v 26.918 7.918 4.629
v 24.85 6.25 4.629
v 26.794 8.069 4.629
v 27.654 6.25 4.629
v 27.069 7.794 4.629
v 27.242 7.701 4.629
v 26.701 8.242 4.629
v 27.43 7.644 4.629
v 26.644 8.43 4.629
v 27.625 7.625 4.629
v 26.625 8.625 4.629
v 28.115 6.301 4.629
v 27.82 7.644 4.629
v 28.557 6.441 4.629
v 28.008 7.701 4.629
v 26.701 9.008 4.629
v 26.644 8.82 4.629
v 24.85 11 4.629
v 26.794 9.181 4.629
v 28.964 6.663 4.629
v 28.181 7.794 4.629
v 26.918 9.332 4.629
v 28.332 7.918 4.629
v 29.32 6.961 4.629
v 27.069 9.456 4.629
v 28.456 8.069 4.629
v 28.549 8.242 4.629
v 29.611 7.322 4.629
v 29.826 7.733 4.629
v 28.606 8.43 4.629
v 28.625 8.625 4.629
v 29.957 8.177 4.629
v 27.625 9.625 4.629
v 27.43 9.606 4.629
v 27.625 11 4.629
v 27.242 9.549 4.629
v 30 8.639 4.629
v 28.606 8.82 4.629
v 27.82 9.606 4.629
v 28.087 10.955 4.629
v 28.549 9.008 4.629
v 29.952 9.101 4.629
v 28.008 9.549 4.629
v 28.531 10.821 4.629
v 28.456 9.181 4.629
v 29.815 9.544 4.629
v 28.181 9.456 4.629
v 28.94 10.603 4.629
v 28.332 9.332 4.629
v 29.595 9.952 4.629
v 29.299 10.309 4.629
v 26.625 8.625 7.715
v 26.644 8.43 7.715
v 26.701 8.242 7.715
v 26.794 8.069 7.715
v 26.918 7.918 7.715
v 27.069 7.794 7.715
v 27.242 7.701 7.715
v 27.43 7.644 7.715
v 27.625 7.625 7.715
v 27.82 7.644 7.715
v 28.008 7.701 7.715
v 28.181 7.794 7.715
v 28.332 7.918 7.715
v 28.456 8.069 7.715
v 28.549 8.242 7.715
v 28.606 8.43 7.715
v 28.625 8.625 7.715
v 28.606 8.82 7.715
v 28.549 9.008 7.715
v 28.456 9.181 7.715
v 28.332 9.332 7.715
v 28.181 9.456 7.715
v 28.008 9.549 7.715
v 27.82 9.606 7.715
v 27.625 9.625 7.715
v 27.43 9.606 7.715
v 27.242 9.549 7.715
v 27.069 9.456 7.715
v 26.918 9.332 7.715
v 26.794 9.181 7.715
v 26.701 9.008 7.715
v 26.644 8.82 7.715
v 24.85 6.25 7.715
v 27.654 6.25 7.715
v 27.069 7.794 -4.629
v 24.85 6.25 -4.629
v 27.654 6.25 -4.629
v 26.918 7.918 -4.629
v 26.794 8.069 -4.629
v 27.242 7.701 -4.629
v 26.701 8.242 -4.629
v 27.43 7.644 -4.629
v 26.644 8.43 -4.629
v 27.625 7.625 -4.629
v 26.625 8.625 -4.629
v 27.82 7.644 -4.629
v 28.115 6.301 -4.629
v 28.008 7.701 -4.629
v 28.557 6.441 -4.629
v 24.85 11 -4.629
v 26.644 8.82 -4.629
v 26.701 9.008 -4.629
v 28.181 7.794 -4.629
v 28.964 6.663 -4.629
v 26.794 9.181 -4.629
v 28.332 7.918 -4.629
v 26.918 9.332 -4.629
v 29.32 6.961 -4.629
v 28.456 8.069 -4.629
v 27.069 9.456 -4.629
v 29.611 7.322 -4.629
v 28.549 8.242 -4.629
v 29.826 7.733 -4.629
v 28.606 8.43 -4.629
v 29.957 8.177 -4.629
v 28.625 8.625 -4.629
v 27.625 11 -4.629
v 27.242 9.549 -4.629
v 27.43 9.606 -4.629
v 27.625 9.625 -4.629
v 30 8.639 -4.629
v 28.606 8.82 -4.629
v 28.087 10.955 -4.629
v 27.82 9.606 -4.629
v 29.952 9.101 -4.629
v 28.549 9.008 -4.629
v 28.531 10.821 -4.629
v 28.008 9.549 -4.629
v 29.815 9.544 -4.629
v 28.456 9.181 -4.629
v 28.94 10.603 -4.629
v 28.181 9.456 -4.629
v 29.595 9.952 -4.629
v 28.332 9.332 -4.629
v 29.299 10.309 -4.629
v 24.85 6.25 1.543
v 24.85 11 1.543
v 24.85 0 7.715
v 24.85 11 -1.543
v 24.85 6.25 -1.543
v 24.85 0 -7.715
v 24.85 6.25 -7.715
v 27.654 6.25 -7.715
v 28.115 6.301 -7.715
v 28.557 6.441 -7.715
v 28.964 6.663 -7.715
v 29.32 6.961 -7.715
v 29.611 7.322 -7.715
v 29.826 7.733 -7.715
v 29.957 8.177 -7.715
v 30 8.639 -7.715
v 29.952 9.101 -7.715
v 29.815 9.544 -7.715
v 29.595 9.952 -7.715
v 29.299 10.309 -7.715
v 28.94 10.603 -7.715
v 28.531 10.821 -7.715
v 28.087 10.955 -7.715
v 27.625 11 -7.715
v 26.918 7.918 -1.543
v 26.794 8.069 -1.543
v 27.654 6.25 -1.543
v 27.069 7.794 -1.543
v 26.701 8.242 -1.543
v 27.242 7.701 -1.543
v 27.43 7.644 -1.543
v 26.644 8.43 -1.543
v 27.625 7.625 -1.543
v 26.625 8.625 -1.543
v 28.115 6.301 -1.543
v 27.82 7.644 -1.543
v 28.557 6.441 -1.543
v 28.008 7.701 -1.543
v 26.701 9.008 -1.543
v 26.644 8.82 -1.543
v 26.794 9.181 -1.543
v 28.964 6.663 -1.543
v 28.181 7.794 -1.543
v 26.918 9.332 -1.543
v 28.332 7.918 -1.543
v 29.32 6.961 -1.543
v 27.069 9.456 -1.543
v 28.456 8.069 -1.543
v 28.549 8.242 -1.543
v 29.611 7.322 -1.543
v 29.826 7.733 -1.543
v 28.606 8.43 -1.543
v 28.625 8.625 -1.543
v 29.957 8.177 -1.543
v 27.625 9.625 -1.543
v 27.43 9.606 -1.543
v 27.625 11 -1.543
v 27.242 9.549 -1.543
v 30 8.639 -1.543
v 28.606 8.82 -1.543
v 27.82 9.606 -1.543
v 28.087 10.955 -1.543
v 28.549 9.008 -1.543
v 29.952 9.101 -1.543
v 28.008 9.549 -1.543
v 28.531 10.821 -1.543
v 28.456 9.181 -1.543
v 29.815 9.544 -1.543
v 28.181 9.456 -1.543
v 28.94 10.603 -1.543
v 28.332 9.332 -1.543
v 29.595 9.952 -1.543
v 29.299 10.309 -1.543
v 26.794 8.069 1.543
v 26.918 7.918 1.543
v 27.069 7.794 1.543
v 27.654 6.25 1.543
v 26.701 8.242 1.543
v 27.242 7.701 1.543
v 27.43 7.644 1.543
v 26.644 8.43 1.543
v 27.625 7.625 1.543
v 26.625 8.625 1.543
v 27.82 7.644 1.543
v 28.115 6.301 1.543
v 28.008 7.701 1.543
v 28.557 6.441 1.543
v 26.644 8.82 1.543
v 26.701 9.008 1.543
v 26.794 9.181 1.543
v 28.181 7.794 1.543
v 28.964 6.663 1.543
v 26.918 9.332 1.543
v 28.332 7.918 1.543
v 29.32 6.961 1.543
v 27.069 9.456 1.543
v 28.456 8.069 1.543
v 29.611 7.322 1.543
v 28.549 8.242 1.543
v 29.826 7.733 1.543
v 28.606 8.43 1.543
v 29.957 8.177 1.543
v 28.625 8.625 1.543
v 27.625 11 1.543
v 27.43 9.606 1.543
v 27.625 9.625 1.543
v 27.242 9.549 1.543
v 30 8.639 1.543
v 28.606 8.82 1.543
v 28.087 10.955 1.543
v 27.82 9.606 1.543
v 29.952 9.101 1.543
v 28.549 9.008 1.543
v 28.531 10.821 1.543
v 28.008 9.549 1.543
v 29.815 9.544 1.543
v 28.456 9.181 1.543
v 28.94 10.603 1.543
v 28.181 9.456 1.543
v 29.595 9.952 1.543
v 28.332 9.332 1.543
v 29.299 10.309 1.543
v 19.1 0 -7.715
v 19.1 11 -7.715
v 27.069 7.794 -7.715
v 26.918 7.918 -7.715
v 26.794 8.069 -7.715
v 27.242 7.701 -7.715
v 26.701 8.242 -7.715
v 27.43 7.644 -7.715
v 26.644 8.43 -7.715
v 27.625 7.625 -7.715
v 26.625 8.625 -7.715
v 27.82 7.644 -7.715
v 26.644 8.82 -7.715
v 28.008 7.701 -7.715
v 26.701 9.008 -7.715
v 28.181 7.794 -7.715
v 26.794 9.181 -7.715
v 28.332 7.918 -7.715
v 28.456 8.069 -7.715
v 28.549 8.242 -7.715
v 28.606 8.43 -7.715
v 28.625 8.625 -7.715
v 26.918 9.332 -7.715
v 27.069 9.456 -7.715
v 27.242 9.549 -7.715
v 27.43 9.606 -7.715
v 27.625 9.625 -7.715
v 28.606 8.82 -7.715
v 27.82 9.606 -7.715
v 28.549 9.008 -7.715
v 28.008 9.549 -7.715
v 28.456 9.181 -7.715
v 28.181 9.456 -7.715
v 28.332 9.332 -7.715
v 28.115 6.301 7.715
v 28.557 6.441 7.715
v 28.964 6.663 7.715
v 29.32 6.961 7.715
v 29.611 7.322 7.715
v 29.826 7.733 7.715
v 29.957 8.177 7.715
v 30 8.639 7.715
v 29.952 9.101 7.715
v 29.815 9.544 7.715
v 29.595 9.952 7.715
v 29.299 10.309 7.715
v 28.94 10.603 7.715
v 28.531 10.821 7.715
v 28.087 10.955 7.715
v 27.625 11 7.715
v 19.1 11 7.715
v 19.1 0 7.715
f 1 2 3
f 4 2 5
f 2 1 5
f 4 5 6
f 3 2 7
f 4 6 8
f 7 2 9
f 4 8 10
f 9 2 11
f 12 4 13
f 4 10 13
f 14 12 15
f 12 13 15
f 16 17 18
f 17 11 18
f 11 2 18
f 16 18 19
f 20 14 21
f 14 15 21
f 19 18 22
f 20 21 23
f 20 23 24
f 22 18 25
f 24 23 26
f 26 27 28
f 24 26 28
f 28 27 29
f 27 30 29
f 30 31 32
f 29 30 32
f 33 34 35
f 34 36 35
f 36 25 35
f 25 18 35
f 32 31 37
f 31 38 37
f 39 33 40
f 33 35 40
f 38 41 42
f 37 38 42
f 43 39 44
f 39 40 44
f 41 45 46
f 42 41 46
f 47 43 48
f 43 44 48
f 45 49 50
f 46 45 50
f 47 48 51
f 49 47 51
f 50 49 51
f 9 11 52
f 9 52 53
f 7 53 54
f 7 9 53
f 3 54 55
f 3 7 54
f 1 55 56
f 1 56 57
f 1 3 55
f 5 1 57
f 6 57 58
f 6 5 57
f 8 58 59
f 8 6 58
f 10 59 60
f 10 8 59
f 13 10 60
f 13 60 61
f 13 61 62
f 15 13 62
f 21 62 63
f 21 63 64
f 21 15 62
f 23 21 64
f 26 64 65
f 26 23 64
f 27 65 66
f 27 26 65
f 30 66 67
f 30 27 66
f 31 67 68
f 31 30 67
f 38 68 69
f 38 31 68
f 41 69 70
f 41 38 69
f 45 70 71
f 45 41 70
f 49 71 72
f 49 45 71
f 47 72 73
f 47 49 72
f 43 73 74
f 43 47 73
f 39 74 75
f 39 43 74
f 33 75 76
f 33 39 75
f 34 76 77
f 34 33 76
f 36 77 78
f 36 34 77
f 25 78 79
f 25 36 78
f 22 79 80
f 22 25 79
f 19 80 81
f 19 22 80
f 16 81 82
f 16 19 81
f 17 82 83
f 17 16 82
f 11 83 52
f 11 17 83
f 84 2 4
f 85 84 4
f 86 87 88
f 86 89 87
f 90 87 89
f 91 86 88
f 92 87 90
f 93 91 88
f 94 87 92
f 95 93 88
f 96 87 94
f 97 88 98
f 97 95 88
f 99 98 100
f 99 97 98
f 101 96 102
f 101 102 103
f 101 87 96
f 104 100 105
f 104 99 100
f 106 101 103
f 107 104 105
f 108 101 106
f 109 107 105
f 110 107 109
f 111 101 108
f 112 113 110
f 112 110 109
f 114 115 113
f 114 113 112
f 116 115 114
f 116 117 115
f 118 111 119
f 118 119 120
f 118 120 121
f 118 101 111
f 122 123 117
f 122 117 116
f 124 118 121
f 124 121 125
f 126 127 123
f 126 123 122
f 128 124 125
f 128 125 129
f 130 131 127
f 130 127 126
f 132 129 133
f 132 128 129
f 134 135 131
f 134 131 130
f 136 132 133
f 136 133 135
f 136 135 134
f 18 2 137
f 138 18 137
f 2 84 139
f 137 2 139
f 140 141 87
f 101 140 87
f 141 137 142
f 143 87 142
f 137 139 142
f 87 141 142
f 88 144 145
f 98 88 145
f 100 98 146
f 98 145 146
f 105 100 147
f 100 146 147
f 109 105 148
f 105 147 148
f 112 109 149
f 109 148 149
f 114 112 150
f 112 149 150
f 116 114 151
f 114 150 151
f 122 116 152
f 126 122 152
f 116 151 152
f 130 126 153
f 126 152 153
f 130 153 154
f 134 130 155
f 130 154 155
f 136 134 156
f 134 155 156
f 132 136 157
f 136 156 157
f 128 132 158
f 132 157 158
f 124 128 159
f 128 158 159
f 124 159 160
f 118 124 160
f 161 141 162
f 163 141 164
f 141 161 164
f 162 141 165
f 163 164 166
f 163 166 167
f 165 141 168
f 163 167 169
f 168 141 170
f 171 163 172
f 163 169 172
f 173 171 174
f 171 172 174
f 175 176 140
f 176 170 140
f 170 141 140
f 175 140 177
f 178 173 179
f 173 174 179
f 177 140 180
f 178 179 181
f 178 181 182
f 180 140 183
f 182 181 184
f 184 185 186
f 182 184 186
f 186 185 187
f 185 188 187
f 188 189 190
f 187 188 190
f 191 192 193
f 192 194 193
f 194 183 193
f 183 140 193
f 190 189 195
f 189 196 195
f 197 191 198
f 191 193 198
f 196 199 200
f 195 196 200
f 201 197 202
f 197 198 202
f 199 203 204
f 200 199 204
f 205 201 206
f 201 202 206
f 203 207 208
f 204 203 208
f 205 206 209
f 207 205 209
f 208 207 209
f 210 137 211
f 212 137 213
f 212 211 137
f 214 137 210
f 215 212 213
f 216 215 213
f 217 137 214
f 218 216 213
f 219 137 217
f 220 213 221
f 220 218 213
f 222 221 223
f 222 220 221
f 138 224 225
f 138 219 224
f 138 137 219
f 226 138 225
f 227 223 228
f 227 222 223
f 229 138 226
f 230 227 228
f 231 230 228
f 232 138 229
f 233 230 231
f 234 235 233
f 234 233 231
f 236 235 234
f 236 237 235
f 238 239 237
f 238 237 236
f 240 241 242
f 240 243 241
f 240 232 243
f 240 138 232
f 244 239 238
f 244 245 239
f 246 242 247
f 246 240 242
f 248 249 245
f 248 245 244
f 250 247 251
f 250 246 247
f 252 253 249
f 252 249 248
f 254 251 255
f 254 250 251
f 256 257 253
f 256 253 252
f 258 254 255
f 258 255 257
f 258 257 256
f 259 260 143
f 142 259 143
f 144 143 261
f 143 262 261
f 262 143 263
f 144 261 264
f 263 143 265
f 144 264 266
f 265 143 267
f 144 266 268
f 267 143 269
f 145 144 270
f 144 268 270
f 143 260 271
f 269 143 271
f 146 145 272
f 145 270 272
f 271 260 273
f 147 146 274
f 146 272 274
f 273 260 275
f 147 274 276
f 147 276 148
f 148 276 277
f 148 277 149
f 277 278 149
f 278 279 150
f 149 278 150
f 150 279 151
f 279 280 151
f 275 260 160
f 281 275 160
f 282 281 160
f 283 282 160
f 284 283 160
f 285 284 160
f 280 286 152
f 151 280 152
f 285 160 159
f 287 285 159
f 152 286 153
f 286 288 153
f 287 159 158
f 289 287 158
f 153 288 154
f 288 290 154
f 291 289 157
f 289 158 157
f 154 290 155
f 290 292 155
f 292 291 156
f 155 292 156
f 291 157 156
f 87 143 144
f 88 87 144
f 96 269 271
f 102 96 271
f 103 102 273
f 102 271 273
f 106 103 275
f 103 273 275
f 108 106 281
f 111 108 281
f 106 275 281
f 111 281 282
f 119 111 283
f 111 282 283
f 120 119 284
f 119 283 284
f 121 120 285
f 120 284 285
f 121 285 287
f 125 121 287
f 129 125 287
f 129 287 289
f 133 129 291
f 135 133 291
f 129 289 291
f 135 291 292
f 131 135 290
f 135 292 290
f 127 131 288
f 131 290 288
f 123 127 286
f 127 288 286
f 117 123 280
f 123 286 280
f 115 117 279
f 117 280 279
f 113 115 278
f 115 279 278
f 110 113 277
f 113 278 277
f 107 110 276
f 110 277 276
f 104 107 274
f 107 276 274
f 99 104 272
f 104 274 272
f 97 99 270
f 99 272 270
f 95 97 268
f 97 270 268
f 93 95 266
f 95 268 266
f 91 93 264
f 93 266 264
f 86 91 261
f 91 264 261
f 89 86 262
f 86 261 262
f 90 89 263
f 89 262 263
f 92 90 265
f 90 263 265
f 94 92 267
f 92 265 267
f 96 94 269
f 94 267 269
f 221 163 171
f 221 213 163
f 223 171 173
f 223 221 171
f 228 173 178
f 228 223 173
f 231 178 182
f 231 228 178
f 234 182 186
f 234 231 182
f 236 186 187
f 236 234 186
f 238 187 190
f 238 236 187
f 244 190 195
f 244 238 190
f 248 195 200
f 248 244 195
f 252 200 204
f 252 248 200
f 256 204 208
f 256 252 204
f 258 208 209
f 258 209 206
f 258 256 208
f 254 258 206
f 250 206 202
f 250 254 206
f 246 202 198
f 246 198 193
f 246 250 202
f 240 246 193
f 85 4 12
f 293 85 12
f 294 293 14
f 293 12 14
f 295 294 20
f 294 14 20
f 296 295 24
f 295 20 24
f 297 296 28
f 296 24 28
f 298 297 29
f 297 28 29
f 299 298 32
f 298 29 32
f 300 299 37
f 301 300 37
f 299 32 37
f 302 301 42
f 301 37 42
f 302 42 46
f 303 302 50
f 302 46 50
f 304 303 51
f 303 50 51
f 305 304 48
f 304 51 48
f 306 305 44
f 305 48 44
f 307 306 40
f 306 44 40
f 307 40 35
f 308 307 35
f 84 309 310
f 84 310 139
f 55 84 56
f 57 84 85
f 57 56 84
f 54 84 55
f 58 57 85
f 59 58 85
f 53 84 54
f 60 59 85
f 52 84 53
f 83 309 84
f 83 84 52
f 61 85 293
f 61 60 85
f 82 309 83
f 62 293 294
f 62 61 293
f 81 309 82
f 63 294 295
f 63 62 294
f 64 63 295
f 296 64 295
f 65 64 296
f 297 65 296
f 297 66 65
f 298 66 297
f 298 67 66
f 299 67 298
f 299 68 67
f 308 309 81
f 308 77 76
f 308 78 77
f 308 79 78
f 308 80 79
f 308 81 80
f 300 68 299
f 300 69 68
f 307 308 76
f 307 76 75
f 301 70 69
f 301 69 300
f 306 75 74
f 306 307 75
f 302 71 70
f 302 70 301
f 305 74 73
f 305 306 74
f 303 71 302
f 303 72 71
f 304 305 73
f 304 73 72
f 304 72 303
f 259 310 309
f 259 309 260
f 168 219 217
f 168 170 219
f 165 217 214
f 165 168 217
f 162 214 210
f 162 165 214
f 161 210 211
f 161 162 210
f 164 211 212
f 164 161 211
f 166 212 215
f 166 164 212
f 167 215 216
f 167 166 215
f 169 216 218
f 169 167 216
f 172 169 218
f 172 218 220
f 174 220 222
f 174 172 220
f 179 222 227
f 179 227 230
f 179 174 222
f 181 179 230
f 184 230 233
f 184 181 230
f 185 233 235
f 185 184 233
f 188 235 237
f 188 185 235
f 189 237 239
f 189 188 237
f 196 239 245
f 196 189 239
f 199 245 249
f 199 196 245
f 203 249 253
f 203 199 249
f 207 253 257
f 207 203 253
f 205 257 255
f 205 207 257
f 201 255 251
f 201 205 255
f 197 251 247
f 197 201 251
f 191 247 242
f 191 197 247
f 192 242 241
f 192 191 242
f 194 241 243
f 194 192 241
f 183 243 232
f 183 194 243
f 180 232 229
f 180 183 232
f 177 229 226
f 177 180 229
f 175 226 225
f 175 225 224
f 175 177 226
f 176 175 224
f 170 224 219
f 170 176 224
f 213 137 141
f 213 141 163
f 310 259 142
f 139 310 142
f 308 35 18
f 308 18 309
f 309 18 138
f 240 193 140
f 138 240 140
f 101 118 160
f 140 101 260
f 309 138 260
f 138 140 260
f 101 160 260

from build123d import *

# Parameters (mm, degrees)
SKETCH1_W           = 5.75
SKETCH1_H           = 15.43
BOSS_EXTRUDE3_DEPTH = 11
SKETCH3_R           = 1
BOSS_EXTRUDE4_DEPTH = 3.086
SKETCH4_R           = 1
BOSS_EXTRUDE5_DEPTH = 1.543
BOSS_EXTRUDE6_START = -3.086
SKETCH5_R           = 1
BOSS_EXTRUDE6_DEPTH = 3.086


with BuildPart() as part:
    # Sketch1 → Boss-Extrude3 (new body)
    with BuildSketch(Plane(origin=(0, 0, 0), x_dir=(1, 0, 0), z_dir=(0, 1, 0))):
        with Locations((21.975, 0)):
            Rectangle(SKETCH1_W, SKETCH1_H)
    extrude(amount=BOSS_EXTRUDE3_DEPTH)

    # Sketch3 → Boss-Extrude4 (add)
    with BuildSketch(Plane(origin=(0, 0, -7.715), x_dir=(-1, 0, 0), z_dir=(0, 0, -1))):
        with BuildLine():
            Line((-24.85, 11), (-24.85, 6.250173181))
            Line((-24.85, 6.250173181), (-27.653680617, 6.250173181))
            ThreePointArc((-27.653680617, 6.250173181), (-29.999956704, 8.63934057), (-27.625, 11))
            Line((-27.625, 11), (-24.85, 11))
        make_face()
        with Locations((-27.625, 8.625)):
            Circle(SKETCH3_R, mode=Mode.SUBTRACT)
    extrude(amount=-BOSS_EXTRUDE4_DEPTH)

    # Sketch4 → Boss-Extrude5 (add, symmetric)
    with BuildSketch(Plane.XY):
        with BuildLine():
            Line((27.625, 11), (24.85, 11))
            Line((24.85, 11), (24.85, 6.250173181))
            Line((24.85, 6.250173181), (27.653680617, 6.250173181))
            ThreePointArc((27.653680617, 6.250173181), (29.999956704, 8.63934057), (27.625, 11))
        make_face()
        with Locations(Location((27.625, 8.625, 0), (0, 0, 180))):
            Circle(SKETCH4_R, mode=Mode.SUBTRACT)
    extrude(amount=BOSS_EXTRUDE5_DEPTH, both=True)

    # Sketch5 → Boss-Extrude6 (add)
    with BuildSketch(Plane.XY.offset(7.715).offset(BOSS_EXTRUDE6_START)):
        with BuildLine():
            Line((24.85, 6.250173181), (27.653680617, 6.250173181))
            ThreePointArc((27.653680617, 6.250173181), (29.999956704, 8.63934057), (27.625, 11))
            Line((27.625, 11), (24.85, 11))
            Line((24.85, 11), (24.85, 6.250173181))
        make_face()
        with Locations(Location((27.625, 8.625, 0), (0, 0, 180))):
            Circle(SKETCH5_R, mode=Mode.SUBTRACT)
    extrude(amount=BOSS_EXTRUDE6_DEPTH)


solid = part.part
